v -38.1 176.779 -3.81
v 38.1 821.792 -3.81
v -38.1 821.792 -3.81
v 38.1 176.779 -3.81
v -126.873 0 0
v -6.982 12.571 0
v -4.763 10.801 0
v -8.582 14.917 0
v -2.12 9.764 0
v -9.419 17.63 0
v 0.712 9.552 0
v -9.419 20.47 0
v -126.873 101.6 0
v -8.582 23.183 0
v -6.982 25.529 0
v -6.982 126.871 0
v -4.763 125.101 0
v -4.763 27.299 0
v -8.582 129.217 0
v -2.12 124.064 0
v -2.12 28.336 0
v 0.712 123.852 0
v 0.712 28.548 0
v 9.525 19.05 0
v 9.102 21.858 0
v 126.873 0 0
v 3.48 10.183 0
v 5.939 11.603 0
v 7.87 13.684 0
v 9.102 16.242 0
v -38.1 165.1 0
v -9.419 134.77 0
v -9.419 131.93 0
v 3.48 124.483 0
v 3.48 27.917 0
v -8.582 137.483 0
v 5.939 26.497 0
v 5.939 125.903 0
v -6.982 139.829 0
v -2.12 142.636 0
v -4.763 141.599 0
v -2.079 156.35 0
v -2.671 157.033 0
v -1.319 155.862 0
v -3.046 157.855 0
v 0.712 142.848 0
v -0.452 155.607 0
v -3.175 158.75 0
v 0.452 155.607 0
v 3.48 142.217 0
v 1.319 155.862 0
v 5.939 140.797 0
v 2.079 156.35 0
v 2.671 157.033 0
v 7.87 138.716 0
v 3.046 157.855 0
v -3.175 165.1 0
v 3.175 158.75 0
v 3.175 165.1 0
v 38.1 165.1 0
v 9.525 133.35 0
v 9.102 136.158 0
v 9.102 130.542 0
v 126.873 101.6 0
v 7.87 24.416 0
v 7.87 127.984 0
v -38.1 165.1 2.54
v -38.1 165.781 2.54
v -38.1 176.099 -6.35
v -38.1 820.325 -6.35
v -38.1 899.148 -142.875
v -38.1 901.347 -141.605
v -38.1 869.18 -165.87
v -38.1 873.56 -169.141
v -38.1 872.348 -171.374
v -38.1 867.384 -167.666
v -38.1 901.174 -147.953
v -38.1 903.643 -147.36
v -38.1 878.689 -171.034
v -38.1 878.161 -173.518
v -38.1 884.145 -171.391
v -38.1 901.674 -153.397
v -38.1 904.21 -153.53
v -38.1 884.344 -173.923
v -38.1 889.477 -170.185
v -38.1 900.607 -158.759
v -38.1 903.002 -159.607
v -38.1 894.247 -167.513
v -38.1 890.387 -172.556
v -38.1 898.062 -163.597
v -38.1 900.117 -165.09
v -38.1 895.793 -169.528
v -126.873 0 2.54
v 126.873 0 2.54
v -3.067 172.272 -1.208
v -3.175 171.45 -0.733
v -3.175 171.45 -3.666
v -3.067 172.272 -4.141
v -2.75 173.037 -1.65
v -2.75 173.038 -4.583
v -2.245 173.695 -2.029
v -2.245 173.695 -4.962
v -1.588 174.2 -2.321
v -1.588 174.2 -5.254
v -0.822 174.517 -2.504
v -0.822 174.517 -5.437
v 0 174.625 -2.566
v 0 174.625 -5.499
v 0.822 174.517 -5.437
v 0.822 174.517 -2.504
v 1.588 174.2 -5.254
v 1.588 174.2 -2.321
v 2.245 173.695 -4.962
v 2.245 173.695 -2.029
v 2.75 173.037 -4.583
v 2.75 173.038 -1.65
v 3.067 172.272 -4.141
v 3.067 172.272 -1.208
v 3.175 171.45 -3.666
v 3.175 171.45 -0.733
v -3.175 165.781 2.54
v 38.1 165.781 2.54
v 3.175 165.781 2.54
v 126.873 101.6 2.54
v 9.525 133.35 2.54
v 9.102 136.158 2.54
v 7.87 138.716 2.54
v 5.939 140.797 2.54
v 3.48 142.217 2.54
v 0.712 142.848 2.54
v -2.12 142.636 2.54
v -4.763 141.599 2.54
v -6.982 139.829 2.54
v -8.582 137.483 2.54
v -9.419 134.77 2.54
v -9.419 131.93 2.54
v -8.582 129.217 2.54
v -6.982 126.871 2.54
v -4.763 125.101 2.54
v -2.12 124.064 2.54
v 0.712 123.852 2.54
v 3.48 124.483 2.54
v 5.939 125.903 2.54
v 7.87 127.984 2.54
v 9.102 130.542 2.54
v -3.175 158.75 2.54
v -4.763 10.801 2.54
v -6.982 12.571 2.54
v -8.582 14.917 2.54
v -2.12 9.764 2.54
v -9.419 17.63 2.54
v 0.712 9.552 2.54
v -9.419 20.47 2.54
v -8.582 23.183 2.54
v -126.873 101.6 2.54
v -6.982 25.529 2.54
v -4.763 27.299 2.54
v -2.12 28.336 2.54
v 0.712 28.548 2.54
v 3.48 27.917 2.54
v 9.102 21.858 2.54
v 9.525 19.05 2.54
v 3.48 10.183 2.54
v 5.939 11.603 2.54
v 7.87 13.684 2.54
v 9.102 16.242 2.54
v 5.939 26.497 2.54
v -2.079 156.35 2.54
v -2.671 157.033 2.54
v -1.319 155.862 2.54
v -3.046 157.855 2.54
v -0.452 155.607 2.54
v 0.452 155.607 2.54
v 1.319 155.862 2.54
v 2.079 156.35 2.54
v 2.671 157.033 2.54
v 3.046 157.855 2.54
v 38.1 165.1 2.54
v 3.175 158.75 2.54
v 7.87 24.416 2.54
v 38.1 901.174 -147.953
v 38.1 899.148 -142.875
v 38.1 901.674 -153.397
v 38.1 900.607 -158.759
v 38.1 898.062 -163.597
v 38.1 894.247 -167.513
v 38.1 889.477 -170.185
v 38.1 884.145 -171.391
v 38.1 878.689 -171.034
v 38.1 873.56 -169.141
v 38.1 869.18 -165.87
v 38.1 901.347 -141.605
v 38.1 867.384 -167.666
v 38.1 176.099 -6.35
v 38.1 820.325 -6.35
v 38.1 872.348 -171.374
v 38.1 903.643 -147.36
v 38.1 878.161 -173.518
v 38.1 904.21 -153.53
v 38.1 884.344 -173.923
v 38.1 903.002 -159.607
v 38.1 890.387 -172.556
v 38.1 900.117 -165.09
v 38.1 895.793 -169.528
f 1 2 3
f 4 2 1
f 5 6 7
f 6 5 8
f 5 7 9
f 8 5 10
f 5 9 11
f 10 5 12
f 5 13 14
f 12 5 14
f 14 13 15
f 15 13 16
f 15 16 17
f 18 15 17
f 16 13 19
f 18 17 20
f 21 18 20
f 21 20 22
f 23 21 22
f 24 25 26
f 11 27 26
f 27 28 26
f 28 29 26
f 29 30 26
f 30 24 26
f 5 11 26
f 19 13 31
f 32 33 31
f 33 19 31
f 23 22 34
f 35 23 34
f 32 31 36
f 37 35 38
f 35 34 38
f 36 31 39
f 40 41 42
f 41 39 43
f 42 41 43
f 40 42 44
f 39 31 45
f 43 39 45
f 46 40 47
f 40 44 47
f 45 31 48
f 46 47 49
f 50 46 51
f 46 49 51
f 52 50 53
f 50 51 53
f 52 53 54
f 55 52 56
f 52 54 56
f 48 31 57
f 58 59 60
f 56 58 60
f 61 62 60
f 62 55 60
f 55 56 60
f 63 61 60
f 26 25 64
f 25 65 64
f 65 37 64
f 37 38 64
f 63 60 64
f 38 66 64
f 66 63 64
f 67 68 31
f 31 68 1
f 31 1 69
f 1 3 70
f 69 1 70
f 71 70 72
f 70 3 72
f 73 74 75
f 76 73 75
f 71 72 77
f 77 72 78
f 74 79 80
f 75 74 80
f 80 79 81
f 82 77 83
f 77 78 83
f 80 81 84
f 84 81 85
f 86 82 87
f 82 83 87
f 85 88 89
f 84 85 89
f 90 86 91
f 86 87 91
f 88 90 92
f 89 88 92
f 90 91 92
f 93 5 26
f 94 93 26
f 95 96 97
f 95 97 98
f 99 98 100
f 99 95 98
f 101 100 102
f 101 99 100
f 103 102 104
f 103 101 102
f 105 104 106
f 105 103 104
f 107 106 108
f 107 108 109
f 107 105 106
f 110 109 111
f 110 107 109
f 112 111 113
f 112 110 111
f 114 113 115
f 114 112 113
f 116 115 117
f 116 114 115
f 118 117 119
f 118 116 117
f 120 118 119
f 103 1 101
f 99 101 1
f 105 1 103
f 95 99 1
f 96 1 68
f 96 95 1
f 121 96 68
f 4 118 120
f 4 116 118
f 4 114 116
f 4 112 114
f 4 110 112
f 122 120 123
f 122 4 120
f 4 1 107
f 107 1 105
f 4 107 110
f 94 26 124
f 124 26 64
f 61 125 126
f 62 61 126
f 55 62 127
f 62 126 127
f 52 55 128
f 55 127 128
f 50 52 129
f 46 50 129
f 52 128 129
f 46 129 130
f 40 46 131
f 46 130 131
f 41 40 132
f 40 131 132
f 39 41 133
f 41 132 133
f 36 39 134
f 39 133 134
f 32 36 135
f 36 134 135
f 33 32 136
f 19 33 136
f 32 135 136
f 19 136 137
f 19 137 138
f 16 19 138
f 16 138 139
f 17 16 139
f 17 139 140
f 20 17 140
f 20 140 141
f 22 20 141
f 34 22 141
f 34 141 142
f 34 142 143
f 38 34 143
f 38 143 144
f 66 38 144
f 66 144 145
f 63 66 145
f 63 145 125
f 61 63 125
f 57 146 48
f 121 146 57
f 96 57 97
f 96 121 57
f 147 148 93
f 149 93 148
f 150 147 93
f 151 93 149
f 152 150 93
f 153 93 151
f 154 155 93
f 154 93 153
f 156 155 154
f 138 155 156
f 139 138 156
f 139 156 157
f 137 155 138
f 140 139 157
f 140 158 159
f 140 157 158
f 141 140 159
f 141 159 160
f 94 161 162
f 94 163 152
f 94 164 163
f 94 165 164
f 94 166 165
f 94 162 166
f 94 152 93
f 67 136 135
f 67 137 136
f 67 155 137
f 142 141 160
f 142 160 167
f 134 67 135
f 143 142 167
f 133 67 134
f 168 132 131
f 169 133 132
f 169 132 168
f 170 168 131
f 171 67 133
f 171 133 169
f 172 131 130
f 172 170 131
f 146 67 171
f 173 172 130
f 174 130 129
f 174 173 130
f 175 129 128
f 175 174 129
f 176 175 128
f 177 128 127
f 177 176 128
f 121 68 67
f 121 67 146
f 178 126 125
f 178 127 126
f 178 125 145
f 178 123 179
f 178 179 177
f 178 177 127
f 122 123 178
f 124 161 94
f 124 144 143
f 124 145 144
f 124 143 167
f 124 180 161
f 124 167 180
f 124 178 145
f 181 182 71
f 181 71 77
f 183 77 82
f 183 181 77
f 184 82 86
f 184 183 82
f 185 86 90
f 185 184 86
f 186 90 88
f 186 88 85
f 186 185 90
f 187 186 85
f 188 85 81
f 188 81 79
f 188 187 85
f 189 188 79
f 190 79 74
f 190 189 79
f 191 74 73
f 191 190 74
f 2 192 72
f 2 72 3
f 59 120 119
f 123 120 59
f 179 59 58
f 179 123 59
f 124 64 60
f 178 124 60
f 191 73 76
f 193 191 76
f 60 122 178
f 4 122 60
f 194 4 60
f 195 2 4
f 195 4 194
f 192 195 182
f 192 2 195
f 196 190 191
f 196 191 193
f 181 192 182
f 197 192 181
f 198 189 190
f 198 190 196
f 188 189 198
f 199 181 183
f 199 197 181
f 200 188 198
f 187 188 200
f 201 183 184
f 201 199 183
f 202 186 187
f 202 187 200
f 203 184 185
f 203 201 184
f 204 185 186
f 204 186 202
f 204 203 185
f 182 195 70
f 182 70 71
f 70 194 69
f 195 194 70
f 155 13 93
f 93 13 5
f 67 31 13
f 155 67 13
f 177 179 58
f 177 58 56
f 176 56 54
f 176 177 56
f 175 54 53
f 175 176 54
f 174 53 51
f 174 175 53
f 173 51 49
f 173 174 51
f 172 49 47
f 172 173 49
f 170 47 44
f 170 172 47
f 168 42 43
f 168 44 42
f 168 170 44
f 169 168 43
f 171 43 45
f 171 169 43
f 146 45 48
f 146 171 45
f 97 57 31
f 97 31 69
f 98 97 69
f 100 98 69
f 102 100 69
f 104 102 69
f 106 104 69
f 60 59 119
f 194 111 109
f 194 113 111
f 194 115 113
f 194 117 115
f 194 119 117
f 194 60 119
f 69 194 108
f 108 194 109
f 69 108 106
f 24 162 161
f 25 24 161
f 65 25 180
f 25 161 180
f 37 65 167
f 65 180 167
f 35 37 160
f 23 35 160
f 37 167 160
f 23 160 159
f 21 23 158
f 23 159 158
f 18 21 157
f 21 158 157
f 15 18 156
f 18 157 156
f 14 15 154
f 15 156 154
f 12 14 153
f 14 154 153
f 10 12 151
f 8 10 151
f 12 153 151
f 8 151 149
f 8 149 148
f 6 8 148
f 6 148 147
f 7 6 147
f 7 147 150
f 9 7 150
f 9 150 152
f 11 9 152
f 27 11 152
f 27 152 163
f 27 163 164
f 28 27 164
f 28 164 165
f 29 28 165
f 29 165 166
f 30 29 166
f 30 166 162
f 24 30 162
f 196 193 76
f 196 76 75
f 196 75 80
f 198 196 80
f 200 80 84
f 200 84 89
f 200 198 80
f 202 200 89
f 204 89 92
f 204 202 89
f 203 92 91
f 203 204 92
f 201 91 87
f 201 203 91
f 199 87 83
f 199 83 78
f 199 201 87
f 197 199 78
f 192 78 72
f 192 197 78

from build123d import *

# Parameters (mm, degrees)
EXTRUDE_THIN1_DEPTH         = 38.1
BOSS_EXTRUDE1_DEPTH         = 2.54
F_3_4_0_75_DIAMETER_HOLE1_D = 19.05
CUT_EXTRUDE1_DEPTH          = 177.53


with BuildPart() as part:
    # Sketch1 → Extrude-Thin1 (new body, symmetric)
    with BuildSketch(Plane(origin=(0, 0, 0), x_dir=(0, 0, -1), z_dir=(1, 0, 0))):
        with BuildLine():
            Line((0, 0), (0, 165.1))
            Line((0, 165.1), (6.35, 176.098522628))
            Line((6.35, 176.098522628), (6.35, 820.325038441))
            Line((6.35, 820.325038441), (142.875, 899.147783942))
            ThreePointArc((142.875, 899.147783942), (167.513381133, 894.246905223), (165.870384182, 869.179615818))
            Line((165.870384182, 869.179615818), (167.666435406, 867.383564594))
            ThreePointArc((167.666435406, 867.383564594), (169.528498617, 895.793159252), (141.605, 901.347488468))
            Line((141.605, 901.347488468), (3.81, 821.791508125))
            Line((3.81, 821.791508125), (3.81, 176.779113577))
            Line((3.81, 176.779113577), (-2.54, 165.780590949))
            Line((-2.54, 165.780590949), (-2.54, 0))
            Line((-2.54, 0), (0, 0))
        make_face()
    extrude(amount=EXTRUDE_THIN1_DEPTH, both=True)

    # Sketch5 → Boss-Extrude1 (add)
    with BuildSketch(Plane(origin=(0, 0, 0), x_dir=(-1, 0, 0), z_dir=(0, 0, -1))):
        Polygon((126.873, 0), (-126.873, 0), (-126.873, 101.6), (-38.1, 165.1), (38.1, 165.1), (126.873, 101.6), align=None)
    extrude(amount=-BOSS_EXTRUDE1_DEPTH)

    # 3/4 (0.75) Diameter Hole1 (through all)
    with Locations(Plane(origin=(0, 0, 0), x_dir=(-1, 0, 0), z_dir=(0, 0, -1))):
        with Locations((0, 19.05), (0, 133.35)):
            Hole(F_3_4_0_75_DIAMETER_HOLE1_D / 2)

    # Sketch4 → Cut-Extrude1 (cut, through all)
    with BuildSketch(Plane.XY.offset(2.54)):
        with BuildLine():
            Line((-3.175, 158.75), (-3.175, 171.45))
            ThreePointArc((-3.175, 171.45), (0, 174.625), (3.175, 171.45))
            Line((3.175, 171.45), (3.175, 158.75))
            ThreePointArc((3.175, 158.75), (0, 155.575), (-3.175, 158.75))
        make_face()
    extrude(amount=-CUT_EXTRUDE1_DEPTH, mode=Mode.SUBTRACT)


solid = part.part
